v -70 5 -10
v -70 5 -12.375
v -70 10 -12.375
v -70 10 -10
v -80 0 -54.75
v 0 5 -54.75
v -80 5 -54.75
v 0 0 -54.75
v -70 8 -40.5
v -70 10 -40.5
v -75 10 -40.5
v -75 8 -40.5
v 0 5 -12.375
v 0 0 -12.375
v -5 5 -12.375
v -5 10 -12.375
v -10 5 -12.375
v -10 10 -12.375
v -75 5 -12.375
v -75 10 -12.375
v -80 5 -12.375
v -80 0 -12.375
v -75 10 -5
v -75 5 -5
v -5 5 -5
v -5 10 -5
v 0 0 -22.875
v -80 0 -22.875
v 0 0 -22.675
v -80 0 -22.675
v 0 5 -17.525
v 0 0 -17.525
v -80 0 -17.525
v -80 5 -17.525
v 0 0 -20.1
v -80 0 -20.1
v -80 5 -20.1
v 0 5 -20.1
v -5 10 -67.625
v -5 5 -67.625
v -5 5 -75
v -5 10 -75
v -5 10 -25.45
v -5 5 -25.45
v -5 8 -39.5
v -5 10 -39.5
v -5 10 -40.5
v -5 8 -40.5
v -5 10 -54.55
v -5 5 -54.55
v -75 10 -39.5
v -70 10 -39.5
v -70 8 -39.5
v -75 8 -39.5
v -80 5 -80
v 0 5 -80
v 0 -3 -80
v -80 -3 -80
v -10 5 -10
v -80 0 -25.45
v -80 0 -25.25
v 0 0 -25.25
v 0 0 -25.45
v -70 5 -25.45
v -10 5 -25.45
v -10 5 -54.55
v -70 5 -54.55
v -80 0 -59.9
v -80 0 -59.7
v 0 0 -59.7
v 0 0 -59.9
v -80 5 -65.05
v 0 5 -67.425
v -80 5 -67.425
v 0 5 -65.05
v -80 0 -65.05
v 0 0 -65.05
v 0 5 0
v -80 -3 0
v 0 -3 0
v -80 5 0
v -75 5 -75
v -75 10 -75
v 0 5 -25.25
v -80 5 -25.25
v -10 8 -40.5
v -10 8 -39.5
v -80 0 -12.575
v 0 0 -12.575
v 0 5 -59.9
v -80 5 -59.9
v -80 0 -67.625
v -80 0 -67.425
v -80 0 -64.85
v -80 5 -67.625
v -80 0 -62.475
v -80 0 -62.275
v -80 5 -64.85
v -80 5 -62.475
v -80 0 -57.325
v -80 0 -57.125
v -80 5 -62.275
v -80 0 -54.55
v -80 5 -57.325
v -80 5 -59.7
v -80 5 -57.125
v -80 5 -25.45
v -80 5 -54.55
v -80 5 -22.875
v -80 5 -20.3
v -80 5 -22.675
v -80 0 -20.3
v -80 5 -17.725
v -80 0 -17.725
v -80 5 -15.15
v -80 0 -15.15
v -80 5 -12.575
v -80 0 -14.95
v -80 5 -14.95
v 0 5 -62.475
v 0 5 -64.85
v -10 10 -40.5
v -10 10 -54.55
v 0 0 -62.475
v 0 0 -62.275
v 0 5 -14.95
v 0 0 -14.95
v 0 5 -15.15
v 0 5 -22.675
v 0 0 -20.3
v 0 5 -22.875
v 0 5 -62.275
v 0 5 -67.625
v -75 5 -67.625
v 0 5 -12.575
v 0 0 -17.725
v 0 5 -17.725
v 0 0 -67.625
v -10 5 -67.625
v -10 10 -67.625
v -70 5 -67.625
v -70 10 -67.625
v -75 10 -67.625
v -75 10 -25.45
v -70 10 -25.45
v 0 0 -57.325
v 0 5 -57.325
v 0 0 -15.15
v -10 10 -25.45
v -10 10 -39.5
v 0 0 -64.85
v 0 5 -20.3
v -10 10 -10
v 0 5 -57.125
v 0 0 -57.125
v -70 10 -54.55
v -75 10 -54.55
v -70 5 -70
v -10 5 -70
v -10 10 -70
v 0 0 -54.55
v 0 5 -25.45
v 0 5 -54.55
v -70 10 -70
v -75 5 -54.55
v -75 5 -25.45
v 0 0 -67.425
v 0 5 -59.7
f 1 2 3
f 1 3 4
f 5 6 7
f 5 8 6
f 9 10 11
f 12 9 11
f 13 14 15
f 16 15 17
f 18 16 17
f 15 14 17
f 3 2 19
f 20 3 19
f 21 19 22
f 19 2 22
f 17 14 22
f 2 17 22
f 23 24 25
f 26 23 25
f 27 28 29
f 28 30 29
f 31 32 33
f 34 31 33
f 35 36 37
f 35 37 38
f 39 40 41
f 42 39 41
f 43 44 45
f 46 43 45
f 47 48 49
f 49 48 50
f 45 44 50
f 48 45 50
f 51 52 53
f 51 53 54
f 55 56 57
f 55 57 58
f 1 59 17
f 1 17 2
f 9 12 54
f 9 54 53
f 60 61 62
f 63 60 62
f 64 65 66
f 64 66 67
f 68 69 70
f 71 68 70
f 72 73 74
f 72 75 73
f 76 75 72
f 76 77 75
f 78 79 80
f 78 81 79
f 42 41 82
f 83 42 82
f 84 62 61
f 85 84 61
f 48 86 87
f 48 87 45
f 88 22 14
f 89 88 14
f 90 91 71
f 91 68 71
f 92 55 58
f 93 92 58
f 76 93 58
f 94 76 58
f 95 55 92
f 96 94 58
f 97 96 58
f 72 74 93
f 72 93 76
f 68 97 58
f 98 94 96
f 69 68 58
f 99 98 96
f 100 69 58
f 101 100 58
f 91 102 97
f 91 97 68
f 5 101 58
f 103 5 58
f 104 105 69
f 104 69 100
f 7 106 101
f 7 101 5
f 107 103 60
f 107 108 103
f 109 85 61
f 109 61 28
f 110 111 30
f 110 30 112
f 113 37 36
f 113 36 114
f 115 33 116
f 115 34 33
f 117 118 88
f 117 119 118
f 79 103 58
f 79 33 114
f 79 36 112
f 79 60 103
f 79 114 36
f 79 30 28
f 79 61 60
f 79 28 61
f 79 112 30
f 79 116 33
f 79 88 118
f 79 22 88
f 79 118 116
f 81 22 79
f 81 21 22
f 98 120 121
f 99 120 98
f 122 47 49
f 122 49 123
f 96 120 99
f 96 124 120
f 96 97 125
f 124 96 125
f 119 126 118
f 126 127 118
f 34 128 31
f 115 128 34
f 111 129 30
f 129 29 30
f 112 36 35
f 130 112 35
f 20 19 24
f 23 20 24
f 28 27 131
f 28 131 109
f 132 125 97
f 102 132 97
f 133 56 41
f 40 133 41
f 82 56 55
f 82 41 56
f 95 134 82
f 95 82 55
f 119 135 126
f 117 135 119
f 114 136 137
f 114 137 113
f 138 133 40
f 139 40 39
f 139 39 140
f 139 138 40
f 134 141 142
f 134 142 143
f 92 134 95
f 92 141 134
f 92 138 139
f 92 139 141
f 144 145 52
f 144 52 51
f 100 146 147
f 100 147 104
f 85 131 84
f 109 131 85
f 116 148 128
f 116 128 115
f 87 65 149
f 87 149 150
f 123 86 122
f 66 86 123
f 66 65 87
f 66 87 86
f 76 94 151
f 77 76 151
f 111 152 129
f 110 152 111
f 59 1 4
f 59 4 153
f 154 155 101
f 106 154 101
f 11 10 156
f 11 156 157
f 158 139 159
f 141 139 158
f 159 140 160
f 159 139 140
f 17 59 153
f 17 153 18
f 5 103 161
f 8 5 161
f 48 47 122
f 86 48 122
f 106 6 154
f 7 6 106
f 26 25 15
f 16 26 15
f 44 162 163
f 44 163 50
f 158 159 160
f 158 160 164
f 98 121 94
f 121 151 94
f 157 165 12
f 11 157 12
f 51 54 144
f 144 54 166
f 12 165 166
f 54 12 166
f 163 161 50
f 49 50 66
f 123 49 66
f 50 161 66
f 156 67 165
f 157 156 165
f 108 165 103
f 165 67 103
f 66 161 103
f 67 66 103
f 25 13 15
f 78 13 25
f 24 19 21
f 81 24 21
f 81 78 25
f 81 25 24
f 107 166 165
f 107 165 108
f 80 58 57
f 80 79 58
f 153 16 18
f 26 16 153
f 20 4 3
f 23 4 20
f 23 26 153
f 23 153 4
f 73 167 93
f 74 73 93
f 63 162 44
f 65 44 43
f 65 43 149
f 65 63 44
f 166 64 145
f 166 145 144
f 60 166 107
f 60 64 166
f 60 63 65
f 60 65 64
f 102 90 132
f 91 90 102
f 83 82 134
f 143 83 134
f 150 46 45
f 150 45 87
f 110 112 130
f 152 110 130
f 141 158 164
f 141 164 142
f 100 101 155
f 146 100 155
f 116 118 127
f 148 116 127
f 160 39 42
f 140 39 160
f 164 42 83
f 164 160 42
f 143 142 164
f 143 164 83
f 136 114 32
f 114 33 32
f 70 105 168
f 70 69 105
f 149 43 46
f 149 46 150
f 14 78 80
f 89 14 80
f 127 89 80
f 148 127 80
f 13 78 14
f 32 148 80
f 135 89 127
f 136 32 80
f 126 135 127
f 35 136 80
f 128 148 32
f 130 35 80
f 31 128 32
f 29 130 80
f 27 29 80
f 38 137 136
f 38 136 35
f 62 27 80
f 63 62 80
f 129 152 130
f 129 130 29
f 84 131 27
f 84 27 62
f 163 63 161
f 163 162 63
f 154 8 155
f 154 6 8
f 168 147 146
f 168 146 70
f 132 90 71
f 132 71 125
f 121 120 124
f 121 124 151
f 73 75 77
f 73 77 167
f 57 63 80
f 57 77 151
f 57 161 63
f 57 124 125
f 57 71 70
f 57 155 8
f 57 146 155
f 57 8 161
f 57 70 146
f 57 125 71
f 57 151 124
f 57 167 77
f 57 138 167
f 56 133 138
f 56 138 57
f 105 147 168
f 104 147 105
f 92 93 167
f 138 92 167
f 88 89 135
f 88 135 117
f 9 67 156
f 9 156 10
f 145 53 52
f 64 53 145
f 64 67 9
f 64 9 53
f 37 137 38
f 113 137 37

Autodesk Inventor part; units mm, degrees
ref_plane "YZ Plane" through (0, 0, 0) normal (1, 0, 0) x (0, 1, 0)
ref_plane "XZ Plane" through (0, 0, 0) normal (0, 1, 0) x (-1, 0, 0)
ref_plane "XY Plane" through (0, 0, 0) normal (0, 0, 1) x (1, 0, 0)
sketch "Boceto1" plane through (0, 0, 0) normal (0, 1, 0) x (-1, 0, 0)
  line L0 (0, 0) -> (80, 0)
  line L1 (80, 0) -> (80, -80)
  line L2 (80, -80) -> (0, -80)
  line L3 (0, -80) -> (0, 0)
  line L4 (10, -70) -> (70, -70)
  line L5 (70, -70) -> (70, -10)
  line L6 (70, -10) -> (10, -10)
  line L7 (10, -10) -> (10, -70)
  line L8 (0, -12.375) -> (80, -12.375)
  line L9 (0, -14.95) -> (80, -14.95)
  line L10 (0, -17.525) -> (80, -17.525)
  line L11 (80, -20.1) -> (0, -20.1)
  line L12 (0, -22.675) -> (80, -22.675)
  line L13 (0, -12.575) -> (80, -12.575)
  line L14 (0, -15.15) -> (80, -15.15)
  line L15 (0, -17.725) -> (80, -17.725)
  line L16 (80, -20.3) -> (0, -20.3)
  line L17 (0, -22.875) -> (80, -22.875)
  line L18 (0, -25.25) -> (80, -25.25)
  line L19 (0, -25.45) -> (80, -25.45)
  line L20 (10, -40) -> (80, -40)
  line L21 (0, -67.625) -> (80, -67.625)
  line L22 (0, -65.05) -> (80, -65.05)
  line L23 (0, -62.475) -> (80, -62.475)
  line L24 (80, -59.9) -> (0, -59.9)
  line L25 (0, -57.325) -> (80, -57.325)
  line L26 (0, -67.425) -> (80, -67.425)
  line L27 (0, -64.85) -> (80, -64.85)
  line L28 (0, -62.275) -> (80, -62.275)
  line L29 (80, -59.7) -> (0, -59.7)
  line L30 (0, -57.125) -> (80, -57.125)
  line L31 (0, -54.75) -> (80, -54.75)
  line L32 (0, -54.55) -> (80, -54.55)
  line L33 (75, -5) -> (5, -5)
  line L34 (5, -5) -> (5, -75)
  line L35 (5, -75) -> (75, -75)
  line L36 (75, -75) -> (75, -5)
  line L37 (5, 0) -> (0, 0)
  line L38 (5, -80) -> (0, -80)
  point P0 (10, -12.375)
  point P1 (70, -12.375)
  point P2 (10, -14.95)
  point P3 (70, -14.95)
  point P4 (10, -17.525)
  point P5 (70, -17.525)
  point P6 (70, -20.1)
  point P7 (10, -20.1)
  point P8 (10, -22.675)
  point P9 (70, -22.675)
  point P10 (10, -12.575)
  point P11 (70, -12.575)
  point P12 (10, -15.15)
  point P13 (70, -15.15)
  point P14 (10, -17.725)
  point P15 (70, -17.725)
  point P16 (70, -20.3)
  point P17 (10, -20.3)
  point P18 (10, -22.875)
  point P19 (70, -22.875)
  point P20 (10, -25.25)
  point P21 (70, -25.25)
  point P22 (10, -25.45)
  point P23 (70, -25.45)
  point P24 (10, -67.625)
  point P25 (70, -67.625)
  point P26 (10, -65.05)
  point P27 (70, -65.05)
  point P28 (10, -62.475)
  point P29 (70, -62.475)
  point P30 (70, -59.9)
  point P31 (10, -59.9)
  point P32 (10, -57.325)
  point P33 (70, -57.325)
  point P34 (10, -67.425)
  point P35 (70, -67.425)
  point P36 (10, -64.85)
  point P37 (70, -64.85)
  point P38 (10, -62.275)
  point P39 (70, -62.275)
  point P40 (70, -59.7)
  point P41 (10, -59.7)
  point P42 (10, -57.125)
  point P43 (70, -57.125)
  point P44 (10, -54.75)
  point P45 (70, -54.75)
  point P46 (10, -54.55)
  point P47 (70, -54.55)
  point P48 (75, -12.375)
  point P49 (5, -12.375)
  point P50 (75, -54.55)
  point P51 (75, -25.45)
  point P52 (70, -25.45)
  point P53 (70, -54.55)
  point P54 (5, -25.45)
  point P55 (5, -54.55)
  point P56 (10, -54.55)
  point P57 (10, -25.45)
  point P58 (10, -67.625)
  point P59 (5, -67.625)
  point P60 (75, -67.625)
  point P61 (70, -67.625)
  dimension "d0" = 80
  dimension "d1" = 80
  dimension "d2" = 60
  dimension "d3" = 60
  dimension "d4" = 10
  dimension "d5" = 10
  dimension "d6" = 2.375
  dimension "d7" = 0.2
  dimension "d8" = 2.375
  dimension "d9" = 0.2
  dimension "d10" = 0.2
  dimension "d11" = 0.2
  dimension "d12" = 0.2
  dimension "d13" = 2.375
  dimension "d14" = 2.375
  dimension "d15" = 2.375
  dimension "d16" = 2.375
  dimension "d17" = 0.2
  dimension "d26" = 5
extrude "Extrusión1" add sketch "Boceto1" along normal blind 5 contours L0 L1 L8 L36 L33 L34 L3 | L13 L34 L9 L3 | L34 L33 L36 L8 L5 L6 L7 | L13 L7 L9 L34 | L7 L6 L5 L8 | L1 L9 L36 L13 | L14 L34 L10 L3 | L13 L5 L9 L7 | L36 L9 L5 L13 | L14 L7 L10 L34 | L1 L10 L36 L14 | L15 L34 L11 L3 | L14 L5 L10 L7 | L36 L10 L5 L14 | L15 L7 L11 L34 | L1 L11 L36 L15 | L16 L34 L12 L3 | L15 L5 L11 L7 | L36 L11 L5 L15 | L16 L7 L12 L34 | L1 L12 L36 L16 | L17 L34 L18 L3 | L16 L5 L12 L7 | L36 L12 L5 L16 | L17 L7 L18 L34 | L1 L18 L36 L17 | L19 L34 L32 L3 | L17 L5 L18 L7 | L36 L18 L5 L17 | L19 L7 L32 L34 | L1 L20 L36 L19 | L31 L34 L30 L3 | L19 L5 L20 L7 | L1 L32 L36 L20 | L36 L20 L5 L19 | L31 L7 L30 L34 | L7 L20 L5 L32 | L36 L32 L5 L20 | L25 L34 L29 L3 | L31 L5 L30 L7 | L1 L30 L36 L31 | L25 L7 L29 L34 | L31 L36 L30 L5 | L24 L34 L28 L3 | L25 L5 L29 L7 | L1 L29 L36 L25 | L24 L7 L28 L34 | L25 L36 L29 L5 | L23 L34 L27 L3 | L24 L5 L28 L7 | L1 L28 L36 L24 | L23 L7 L27 L34 | L24 L36 L28 L5 | L22 L34 L26 L3 | L23 L5 L27 L7 | L1 L27 L36 L23 | L22 L7 L26 L34 | L23 L36 L27 L5 | L21 L34 L35 L36 L1 L2 L3 | L22 L5 L26 L7 | L1 L26 L36 L22 | L21 L7 L4 L5 L36 L35 L34 | L22 L36 L26 L5 | L21 L5 L4 L7
sketch "Boceto2" plane through (0, 0, 0) normal (0, -1, 0) x (1, 0, 0)
  line L0 (0, -80) -> (-80, -80) projected
  line L1 (-80, 0) -> (0, 0) projected
  line L2 (-80, -80) -> (-80, 0)
  line L3 (-80, 0) -> (0, 0)
  line L4 (-80, -65.05) -> (0, -65.05) construction
  line L5 (0, 0) -> (0, -80)
  line L6 (-80, -80) -> (0, -80)
extrude "Extrusión4" add sketch "Boceto2" along normal blind 3
extrude "Extrusión5" add sketch "Boceto1" along normal blind 10 contours L34 L33 L36 L8 L5 L6 L7 | L19 L7 L32 L34 | L36 L20 L5 L19 | L36 L32 L5 L20 | L21 L7 L4 L5 L36 L35 L34
sketch "Boceto3" plane through (0, 10, 0) normal (0, 1, 0) x (1, 0, 0)
  line L0 (-5, 25.45) -> (-5, 54.55) projected
  line L1 (-5, 40) -> (-84.1767, 40)
  line L2 (-5, 39.5) -> (-84.1767, 39.5)
  line L3 (-5, 40.5) -> (-84.1767, 40.5)
  line L4 (-10, 54.55) -> (-10, 25.45) projected
  line L5 (-5, 40.5) -> (-5, 39.5)
  line L6 (-84.1767, 40.5) -> (-84.1767, 39.5)
  point P0 (0, 0)
  point P1 (-10, 40)
  point P2 (-10, 39.5)
  point P3 (-10, 40.5)
  dimension "d31" = 0.5
  dimension "d32" = 0.5
extrude "Extrusión6" cut sketch "Boceto3" against normal blind 2
equation "\"d8\" = d6"
equation "\"d9\" = d7"
equation "\"d10\" = d9"
equation "\"d11\" = d7"
equation "\"d12\" = d7"
equation "\"d13\" = d6"
equation "\"d14\" = d6"
equation "\"d15\" = d6"
equation "\"d16\" = d6"
equation "\"d17\" = d7"
properties part number "Cortador Ancho PDMS"
